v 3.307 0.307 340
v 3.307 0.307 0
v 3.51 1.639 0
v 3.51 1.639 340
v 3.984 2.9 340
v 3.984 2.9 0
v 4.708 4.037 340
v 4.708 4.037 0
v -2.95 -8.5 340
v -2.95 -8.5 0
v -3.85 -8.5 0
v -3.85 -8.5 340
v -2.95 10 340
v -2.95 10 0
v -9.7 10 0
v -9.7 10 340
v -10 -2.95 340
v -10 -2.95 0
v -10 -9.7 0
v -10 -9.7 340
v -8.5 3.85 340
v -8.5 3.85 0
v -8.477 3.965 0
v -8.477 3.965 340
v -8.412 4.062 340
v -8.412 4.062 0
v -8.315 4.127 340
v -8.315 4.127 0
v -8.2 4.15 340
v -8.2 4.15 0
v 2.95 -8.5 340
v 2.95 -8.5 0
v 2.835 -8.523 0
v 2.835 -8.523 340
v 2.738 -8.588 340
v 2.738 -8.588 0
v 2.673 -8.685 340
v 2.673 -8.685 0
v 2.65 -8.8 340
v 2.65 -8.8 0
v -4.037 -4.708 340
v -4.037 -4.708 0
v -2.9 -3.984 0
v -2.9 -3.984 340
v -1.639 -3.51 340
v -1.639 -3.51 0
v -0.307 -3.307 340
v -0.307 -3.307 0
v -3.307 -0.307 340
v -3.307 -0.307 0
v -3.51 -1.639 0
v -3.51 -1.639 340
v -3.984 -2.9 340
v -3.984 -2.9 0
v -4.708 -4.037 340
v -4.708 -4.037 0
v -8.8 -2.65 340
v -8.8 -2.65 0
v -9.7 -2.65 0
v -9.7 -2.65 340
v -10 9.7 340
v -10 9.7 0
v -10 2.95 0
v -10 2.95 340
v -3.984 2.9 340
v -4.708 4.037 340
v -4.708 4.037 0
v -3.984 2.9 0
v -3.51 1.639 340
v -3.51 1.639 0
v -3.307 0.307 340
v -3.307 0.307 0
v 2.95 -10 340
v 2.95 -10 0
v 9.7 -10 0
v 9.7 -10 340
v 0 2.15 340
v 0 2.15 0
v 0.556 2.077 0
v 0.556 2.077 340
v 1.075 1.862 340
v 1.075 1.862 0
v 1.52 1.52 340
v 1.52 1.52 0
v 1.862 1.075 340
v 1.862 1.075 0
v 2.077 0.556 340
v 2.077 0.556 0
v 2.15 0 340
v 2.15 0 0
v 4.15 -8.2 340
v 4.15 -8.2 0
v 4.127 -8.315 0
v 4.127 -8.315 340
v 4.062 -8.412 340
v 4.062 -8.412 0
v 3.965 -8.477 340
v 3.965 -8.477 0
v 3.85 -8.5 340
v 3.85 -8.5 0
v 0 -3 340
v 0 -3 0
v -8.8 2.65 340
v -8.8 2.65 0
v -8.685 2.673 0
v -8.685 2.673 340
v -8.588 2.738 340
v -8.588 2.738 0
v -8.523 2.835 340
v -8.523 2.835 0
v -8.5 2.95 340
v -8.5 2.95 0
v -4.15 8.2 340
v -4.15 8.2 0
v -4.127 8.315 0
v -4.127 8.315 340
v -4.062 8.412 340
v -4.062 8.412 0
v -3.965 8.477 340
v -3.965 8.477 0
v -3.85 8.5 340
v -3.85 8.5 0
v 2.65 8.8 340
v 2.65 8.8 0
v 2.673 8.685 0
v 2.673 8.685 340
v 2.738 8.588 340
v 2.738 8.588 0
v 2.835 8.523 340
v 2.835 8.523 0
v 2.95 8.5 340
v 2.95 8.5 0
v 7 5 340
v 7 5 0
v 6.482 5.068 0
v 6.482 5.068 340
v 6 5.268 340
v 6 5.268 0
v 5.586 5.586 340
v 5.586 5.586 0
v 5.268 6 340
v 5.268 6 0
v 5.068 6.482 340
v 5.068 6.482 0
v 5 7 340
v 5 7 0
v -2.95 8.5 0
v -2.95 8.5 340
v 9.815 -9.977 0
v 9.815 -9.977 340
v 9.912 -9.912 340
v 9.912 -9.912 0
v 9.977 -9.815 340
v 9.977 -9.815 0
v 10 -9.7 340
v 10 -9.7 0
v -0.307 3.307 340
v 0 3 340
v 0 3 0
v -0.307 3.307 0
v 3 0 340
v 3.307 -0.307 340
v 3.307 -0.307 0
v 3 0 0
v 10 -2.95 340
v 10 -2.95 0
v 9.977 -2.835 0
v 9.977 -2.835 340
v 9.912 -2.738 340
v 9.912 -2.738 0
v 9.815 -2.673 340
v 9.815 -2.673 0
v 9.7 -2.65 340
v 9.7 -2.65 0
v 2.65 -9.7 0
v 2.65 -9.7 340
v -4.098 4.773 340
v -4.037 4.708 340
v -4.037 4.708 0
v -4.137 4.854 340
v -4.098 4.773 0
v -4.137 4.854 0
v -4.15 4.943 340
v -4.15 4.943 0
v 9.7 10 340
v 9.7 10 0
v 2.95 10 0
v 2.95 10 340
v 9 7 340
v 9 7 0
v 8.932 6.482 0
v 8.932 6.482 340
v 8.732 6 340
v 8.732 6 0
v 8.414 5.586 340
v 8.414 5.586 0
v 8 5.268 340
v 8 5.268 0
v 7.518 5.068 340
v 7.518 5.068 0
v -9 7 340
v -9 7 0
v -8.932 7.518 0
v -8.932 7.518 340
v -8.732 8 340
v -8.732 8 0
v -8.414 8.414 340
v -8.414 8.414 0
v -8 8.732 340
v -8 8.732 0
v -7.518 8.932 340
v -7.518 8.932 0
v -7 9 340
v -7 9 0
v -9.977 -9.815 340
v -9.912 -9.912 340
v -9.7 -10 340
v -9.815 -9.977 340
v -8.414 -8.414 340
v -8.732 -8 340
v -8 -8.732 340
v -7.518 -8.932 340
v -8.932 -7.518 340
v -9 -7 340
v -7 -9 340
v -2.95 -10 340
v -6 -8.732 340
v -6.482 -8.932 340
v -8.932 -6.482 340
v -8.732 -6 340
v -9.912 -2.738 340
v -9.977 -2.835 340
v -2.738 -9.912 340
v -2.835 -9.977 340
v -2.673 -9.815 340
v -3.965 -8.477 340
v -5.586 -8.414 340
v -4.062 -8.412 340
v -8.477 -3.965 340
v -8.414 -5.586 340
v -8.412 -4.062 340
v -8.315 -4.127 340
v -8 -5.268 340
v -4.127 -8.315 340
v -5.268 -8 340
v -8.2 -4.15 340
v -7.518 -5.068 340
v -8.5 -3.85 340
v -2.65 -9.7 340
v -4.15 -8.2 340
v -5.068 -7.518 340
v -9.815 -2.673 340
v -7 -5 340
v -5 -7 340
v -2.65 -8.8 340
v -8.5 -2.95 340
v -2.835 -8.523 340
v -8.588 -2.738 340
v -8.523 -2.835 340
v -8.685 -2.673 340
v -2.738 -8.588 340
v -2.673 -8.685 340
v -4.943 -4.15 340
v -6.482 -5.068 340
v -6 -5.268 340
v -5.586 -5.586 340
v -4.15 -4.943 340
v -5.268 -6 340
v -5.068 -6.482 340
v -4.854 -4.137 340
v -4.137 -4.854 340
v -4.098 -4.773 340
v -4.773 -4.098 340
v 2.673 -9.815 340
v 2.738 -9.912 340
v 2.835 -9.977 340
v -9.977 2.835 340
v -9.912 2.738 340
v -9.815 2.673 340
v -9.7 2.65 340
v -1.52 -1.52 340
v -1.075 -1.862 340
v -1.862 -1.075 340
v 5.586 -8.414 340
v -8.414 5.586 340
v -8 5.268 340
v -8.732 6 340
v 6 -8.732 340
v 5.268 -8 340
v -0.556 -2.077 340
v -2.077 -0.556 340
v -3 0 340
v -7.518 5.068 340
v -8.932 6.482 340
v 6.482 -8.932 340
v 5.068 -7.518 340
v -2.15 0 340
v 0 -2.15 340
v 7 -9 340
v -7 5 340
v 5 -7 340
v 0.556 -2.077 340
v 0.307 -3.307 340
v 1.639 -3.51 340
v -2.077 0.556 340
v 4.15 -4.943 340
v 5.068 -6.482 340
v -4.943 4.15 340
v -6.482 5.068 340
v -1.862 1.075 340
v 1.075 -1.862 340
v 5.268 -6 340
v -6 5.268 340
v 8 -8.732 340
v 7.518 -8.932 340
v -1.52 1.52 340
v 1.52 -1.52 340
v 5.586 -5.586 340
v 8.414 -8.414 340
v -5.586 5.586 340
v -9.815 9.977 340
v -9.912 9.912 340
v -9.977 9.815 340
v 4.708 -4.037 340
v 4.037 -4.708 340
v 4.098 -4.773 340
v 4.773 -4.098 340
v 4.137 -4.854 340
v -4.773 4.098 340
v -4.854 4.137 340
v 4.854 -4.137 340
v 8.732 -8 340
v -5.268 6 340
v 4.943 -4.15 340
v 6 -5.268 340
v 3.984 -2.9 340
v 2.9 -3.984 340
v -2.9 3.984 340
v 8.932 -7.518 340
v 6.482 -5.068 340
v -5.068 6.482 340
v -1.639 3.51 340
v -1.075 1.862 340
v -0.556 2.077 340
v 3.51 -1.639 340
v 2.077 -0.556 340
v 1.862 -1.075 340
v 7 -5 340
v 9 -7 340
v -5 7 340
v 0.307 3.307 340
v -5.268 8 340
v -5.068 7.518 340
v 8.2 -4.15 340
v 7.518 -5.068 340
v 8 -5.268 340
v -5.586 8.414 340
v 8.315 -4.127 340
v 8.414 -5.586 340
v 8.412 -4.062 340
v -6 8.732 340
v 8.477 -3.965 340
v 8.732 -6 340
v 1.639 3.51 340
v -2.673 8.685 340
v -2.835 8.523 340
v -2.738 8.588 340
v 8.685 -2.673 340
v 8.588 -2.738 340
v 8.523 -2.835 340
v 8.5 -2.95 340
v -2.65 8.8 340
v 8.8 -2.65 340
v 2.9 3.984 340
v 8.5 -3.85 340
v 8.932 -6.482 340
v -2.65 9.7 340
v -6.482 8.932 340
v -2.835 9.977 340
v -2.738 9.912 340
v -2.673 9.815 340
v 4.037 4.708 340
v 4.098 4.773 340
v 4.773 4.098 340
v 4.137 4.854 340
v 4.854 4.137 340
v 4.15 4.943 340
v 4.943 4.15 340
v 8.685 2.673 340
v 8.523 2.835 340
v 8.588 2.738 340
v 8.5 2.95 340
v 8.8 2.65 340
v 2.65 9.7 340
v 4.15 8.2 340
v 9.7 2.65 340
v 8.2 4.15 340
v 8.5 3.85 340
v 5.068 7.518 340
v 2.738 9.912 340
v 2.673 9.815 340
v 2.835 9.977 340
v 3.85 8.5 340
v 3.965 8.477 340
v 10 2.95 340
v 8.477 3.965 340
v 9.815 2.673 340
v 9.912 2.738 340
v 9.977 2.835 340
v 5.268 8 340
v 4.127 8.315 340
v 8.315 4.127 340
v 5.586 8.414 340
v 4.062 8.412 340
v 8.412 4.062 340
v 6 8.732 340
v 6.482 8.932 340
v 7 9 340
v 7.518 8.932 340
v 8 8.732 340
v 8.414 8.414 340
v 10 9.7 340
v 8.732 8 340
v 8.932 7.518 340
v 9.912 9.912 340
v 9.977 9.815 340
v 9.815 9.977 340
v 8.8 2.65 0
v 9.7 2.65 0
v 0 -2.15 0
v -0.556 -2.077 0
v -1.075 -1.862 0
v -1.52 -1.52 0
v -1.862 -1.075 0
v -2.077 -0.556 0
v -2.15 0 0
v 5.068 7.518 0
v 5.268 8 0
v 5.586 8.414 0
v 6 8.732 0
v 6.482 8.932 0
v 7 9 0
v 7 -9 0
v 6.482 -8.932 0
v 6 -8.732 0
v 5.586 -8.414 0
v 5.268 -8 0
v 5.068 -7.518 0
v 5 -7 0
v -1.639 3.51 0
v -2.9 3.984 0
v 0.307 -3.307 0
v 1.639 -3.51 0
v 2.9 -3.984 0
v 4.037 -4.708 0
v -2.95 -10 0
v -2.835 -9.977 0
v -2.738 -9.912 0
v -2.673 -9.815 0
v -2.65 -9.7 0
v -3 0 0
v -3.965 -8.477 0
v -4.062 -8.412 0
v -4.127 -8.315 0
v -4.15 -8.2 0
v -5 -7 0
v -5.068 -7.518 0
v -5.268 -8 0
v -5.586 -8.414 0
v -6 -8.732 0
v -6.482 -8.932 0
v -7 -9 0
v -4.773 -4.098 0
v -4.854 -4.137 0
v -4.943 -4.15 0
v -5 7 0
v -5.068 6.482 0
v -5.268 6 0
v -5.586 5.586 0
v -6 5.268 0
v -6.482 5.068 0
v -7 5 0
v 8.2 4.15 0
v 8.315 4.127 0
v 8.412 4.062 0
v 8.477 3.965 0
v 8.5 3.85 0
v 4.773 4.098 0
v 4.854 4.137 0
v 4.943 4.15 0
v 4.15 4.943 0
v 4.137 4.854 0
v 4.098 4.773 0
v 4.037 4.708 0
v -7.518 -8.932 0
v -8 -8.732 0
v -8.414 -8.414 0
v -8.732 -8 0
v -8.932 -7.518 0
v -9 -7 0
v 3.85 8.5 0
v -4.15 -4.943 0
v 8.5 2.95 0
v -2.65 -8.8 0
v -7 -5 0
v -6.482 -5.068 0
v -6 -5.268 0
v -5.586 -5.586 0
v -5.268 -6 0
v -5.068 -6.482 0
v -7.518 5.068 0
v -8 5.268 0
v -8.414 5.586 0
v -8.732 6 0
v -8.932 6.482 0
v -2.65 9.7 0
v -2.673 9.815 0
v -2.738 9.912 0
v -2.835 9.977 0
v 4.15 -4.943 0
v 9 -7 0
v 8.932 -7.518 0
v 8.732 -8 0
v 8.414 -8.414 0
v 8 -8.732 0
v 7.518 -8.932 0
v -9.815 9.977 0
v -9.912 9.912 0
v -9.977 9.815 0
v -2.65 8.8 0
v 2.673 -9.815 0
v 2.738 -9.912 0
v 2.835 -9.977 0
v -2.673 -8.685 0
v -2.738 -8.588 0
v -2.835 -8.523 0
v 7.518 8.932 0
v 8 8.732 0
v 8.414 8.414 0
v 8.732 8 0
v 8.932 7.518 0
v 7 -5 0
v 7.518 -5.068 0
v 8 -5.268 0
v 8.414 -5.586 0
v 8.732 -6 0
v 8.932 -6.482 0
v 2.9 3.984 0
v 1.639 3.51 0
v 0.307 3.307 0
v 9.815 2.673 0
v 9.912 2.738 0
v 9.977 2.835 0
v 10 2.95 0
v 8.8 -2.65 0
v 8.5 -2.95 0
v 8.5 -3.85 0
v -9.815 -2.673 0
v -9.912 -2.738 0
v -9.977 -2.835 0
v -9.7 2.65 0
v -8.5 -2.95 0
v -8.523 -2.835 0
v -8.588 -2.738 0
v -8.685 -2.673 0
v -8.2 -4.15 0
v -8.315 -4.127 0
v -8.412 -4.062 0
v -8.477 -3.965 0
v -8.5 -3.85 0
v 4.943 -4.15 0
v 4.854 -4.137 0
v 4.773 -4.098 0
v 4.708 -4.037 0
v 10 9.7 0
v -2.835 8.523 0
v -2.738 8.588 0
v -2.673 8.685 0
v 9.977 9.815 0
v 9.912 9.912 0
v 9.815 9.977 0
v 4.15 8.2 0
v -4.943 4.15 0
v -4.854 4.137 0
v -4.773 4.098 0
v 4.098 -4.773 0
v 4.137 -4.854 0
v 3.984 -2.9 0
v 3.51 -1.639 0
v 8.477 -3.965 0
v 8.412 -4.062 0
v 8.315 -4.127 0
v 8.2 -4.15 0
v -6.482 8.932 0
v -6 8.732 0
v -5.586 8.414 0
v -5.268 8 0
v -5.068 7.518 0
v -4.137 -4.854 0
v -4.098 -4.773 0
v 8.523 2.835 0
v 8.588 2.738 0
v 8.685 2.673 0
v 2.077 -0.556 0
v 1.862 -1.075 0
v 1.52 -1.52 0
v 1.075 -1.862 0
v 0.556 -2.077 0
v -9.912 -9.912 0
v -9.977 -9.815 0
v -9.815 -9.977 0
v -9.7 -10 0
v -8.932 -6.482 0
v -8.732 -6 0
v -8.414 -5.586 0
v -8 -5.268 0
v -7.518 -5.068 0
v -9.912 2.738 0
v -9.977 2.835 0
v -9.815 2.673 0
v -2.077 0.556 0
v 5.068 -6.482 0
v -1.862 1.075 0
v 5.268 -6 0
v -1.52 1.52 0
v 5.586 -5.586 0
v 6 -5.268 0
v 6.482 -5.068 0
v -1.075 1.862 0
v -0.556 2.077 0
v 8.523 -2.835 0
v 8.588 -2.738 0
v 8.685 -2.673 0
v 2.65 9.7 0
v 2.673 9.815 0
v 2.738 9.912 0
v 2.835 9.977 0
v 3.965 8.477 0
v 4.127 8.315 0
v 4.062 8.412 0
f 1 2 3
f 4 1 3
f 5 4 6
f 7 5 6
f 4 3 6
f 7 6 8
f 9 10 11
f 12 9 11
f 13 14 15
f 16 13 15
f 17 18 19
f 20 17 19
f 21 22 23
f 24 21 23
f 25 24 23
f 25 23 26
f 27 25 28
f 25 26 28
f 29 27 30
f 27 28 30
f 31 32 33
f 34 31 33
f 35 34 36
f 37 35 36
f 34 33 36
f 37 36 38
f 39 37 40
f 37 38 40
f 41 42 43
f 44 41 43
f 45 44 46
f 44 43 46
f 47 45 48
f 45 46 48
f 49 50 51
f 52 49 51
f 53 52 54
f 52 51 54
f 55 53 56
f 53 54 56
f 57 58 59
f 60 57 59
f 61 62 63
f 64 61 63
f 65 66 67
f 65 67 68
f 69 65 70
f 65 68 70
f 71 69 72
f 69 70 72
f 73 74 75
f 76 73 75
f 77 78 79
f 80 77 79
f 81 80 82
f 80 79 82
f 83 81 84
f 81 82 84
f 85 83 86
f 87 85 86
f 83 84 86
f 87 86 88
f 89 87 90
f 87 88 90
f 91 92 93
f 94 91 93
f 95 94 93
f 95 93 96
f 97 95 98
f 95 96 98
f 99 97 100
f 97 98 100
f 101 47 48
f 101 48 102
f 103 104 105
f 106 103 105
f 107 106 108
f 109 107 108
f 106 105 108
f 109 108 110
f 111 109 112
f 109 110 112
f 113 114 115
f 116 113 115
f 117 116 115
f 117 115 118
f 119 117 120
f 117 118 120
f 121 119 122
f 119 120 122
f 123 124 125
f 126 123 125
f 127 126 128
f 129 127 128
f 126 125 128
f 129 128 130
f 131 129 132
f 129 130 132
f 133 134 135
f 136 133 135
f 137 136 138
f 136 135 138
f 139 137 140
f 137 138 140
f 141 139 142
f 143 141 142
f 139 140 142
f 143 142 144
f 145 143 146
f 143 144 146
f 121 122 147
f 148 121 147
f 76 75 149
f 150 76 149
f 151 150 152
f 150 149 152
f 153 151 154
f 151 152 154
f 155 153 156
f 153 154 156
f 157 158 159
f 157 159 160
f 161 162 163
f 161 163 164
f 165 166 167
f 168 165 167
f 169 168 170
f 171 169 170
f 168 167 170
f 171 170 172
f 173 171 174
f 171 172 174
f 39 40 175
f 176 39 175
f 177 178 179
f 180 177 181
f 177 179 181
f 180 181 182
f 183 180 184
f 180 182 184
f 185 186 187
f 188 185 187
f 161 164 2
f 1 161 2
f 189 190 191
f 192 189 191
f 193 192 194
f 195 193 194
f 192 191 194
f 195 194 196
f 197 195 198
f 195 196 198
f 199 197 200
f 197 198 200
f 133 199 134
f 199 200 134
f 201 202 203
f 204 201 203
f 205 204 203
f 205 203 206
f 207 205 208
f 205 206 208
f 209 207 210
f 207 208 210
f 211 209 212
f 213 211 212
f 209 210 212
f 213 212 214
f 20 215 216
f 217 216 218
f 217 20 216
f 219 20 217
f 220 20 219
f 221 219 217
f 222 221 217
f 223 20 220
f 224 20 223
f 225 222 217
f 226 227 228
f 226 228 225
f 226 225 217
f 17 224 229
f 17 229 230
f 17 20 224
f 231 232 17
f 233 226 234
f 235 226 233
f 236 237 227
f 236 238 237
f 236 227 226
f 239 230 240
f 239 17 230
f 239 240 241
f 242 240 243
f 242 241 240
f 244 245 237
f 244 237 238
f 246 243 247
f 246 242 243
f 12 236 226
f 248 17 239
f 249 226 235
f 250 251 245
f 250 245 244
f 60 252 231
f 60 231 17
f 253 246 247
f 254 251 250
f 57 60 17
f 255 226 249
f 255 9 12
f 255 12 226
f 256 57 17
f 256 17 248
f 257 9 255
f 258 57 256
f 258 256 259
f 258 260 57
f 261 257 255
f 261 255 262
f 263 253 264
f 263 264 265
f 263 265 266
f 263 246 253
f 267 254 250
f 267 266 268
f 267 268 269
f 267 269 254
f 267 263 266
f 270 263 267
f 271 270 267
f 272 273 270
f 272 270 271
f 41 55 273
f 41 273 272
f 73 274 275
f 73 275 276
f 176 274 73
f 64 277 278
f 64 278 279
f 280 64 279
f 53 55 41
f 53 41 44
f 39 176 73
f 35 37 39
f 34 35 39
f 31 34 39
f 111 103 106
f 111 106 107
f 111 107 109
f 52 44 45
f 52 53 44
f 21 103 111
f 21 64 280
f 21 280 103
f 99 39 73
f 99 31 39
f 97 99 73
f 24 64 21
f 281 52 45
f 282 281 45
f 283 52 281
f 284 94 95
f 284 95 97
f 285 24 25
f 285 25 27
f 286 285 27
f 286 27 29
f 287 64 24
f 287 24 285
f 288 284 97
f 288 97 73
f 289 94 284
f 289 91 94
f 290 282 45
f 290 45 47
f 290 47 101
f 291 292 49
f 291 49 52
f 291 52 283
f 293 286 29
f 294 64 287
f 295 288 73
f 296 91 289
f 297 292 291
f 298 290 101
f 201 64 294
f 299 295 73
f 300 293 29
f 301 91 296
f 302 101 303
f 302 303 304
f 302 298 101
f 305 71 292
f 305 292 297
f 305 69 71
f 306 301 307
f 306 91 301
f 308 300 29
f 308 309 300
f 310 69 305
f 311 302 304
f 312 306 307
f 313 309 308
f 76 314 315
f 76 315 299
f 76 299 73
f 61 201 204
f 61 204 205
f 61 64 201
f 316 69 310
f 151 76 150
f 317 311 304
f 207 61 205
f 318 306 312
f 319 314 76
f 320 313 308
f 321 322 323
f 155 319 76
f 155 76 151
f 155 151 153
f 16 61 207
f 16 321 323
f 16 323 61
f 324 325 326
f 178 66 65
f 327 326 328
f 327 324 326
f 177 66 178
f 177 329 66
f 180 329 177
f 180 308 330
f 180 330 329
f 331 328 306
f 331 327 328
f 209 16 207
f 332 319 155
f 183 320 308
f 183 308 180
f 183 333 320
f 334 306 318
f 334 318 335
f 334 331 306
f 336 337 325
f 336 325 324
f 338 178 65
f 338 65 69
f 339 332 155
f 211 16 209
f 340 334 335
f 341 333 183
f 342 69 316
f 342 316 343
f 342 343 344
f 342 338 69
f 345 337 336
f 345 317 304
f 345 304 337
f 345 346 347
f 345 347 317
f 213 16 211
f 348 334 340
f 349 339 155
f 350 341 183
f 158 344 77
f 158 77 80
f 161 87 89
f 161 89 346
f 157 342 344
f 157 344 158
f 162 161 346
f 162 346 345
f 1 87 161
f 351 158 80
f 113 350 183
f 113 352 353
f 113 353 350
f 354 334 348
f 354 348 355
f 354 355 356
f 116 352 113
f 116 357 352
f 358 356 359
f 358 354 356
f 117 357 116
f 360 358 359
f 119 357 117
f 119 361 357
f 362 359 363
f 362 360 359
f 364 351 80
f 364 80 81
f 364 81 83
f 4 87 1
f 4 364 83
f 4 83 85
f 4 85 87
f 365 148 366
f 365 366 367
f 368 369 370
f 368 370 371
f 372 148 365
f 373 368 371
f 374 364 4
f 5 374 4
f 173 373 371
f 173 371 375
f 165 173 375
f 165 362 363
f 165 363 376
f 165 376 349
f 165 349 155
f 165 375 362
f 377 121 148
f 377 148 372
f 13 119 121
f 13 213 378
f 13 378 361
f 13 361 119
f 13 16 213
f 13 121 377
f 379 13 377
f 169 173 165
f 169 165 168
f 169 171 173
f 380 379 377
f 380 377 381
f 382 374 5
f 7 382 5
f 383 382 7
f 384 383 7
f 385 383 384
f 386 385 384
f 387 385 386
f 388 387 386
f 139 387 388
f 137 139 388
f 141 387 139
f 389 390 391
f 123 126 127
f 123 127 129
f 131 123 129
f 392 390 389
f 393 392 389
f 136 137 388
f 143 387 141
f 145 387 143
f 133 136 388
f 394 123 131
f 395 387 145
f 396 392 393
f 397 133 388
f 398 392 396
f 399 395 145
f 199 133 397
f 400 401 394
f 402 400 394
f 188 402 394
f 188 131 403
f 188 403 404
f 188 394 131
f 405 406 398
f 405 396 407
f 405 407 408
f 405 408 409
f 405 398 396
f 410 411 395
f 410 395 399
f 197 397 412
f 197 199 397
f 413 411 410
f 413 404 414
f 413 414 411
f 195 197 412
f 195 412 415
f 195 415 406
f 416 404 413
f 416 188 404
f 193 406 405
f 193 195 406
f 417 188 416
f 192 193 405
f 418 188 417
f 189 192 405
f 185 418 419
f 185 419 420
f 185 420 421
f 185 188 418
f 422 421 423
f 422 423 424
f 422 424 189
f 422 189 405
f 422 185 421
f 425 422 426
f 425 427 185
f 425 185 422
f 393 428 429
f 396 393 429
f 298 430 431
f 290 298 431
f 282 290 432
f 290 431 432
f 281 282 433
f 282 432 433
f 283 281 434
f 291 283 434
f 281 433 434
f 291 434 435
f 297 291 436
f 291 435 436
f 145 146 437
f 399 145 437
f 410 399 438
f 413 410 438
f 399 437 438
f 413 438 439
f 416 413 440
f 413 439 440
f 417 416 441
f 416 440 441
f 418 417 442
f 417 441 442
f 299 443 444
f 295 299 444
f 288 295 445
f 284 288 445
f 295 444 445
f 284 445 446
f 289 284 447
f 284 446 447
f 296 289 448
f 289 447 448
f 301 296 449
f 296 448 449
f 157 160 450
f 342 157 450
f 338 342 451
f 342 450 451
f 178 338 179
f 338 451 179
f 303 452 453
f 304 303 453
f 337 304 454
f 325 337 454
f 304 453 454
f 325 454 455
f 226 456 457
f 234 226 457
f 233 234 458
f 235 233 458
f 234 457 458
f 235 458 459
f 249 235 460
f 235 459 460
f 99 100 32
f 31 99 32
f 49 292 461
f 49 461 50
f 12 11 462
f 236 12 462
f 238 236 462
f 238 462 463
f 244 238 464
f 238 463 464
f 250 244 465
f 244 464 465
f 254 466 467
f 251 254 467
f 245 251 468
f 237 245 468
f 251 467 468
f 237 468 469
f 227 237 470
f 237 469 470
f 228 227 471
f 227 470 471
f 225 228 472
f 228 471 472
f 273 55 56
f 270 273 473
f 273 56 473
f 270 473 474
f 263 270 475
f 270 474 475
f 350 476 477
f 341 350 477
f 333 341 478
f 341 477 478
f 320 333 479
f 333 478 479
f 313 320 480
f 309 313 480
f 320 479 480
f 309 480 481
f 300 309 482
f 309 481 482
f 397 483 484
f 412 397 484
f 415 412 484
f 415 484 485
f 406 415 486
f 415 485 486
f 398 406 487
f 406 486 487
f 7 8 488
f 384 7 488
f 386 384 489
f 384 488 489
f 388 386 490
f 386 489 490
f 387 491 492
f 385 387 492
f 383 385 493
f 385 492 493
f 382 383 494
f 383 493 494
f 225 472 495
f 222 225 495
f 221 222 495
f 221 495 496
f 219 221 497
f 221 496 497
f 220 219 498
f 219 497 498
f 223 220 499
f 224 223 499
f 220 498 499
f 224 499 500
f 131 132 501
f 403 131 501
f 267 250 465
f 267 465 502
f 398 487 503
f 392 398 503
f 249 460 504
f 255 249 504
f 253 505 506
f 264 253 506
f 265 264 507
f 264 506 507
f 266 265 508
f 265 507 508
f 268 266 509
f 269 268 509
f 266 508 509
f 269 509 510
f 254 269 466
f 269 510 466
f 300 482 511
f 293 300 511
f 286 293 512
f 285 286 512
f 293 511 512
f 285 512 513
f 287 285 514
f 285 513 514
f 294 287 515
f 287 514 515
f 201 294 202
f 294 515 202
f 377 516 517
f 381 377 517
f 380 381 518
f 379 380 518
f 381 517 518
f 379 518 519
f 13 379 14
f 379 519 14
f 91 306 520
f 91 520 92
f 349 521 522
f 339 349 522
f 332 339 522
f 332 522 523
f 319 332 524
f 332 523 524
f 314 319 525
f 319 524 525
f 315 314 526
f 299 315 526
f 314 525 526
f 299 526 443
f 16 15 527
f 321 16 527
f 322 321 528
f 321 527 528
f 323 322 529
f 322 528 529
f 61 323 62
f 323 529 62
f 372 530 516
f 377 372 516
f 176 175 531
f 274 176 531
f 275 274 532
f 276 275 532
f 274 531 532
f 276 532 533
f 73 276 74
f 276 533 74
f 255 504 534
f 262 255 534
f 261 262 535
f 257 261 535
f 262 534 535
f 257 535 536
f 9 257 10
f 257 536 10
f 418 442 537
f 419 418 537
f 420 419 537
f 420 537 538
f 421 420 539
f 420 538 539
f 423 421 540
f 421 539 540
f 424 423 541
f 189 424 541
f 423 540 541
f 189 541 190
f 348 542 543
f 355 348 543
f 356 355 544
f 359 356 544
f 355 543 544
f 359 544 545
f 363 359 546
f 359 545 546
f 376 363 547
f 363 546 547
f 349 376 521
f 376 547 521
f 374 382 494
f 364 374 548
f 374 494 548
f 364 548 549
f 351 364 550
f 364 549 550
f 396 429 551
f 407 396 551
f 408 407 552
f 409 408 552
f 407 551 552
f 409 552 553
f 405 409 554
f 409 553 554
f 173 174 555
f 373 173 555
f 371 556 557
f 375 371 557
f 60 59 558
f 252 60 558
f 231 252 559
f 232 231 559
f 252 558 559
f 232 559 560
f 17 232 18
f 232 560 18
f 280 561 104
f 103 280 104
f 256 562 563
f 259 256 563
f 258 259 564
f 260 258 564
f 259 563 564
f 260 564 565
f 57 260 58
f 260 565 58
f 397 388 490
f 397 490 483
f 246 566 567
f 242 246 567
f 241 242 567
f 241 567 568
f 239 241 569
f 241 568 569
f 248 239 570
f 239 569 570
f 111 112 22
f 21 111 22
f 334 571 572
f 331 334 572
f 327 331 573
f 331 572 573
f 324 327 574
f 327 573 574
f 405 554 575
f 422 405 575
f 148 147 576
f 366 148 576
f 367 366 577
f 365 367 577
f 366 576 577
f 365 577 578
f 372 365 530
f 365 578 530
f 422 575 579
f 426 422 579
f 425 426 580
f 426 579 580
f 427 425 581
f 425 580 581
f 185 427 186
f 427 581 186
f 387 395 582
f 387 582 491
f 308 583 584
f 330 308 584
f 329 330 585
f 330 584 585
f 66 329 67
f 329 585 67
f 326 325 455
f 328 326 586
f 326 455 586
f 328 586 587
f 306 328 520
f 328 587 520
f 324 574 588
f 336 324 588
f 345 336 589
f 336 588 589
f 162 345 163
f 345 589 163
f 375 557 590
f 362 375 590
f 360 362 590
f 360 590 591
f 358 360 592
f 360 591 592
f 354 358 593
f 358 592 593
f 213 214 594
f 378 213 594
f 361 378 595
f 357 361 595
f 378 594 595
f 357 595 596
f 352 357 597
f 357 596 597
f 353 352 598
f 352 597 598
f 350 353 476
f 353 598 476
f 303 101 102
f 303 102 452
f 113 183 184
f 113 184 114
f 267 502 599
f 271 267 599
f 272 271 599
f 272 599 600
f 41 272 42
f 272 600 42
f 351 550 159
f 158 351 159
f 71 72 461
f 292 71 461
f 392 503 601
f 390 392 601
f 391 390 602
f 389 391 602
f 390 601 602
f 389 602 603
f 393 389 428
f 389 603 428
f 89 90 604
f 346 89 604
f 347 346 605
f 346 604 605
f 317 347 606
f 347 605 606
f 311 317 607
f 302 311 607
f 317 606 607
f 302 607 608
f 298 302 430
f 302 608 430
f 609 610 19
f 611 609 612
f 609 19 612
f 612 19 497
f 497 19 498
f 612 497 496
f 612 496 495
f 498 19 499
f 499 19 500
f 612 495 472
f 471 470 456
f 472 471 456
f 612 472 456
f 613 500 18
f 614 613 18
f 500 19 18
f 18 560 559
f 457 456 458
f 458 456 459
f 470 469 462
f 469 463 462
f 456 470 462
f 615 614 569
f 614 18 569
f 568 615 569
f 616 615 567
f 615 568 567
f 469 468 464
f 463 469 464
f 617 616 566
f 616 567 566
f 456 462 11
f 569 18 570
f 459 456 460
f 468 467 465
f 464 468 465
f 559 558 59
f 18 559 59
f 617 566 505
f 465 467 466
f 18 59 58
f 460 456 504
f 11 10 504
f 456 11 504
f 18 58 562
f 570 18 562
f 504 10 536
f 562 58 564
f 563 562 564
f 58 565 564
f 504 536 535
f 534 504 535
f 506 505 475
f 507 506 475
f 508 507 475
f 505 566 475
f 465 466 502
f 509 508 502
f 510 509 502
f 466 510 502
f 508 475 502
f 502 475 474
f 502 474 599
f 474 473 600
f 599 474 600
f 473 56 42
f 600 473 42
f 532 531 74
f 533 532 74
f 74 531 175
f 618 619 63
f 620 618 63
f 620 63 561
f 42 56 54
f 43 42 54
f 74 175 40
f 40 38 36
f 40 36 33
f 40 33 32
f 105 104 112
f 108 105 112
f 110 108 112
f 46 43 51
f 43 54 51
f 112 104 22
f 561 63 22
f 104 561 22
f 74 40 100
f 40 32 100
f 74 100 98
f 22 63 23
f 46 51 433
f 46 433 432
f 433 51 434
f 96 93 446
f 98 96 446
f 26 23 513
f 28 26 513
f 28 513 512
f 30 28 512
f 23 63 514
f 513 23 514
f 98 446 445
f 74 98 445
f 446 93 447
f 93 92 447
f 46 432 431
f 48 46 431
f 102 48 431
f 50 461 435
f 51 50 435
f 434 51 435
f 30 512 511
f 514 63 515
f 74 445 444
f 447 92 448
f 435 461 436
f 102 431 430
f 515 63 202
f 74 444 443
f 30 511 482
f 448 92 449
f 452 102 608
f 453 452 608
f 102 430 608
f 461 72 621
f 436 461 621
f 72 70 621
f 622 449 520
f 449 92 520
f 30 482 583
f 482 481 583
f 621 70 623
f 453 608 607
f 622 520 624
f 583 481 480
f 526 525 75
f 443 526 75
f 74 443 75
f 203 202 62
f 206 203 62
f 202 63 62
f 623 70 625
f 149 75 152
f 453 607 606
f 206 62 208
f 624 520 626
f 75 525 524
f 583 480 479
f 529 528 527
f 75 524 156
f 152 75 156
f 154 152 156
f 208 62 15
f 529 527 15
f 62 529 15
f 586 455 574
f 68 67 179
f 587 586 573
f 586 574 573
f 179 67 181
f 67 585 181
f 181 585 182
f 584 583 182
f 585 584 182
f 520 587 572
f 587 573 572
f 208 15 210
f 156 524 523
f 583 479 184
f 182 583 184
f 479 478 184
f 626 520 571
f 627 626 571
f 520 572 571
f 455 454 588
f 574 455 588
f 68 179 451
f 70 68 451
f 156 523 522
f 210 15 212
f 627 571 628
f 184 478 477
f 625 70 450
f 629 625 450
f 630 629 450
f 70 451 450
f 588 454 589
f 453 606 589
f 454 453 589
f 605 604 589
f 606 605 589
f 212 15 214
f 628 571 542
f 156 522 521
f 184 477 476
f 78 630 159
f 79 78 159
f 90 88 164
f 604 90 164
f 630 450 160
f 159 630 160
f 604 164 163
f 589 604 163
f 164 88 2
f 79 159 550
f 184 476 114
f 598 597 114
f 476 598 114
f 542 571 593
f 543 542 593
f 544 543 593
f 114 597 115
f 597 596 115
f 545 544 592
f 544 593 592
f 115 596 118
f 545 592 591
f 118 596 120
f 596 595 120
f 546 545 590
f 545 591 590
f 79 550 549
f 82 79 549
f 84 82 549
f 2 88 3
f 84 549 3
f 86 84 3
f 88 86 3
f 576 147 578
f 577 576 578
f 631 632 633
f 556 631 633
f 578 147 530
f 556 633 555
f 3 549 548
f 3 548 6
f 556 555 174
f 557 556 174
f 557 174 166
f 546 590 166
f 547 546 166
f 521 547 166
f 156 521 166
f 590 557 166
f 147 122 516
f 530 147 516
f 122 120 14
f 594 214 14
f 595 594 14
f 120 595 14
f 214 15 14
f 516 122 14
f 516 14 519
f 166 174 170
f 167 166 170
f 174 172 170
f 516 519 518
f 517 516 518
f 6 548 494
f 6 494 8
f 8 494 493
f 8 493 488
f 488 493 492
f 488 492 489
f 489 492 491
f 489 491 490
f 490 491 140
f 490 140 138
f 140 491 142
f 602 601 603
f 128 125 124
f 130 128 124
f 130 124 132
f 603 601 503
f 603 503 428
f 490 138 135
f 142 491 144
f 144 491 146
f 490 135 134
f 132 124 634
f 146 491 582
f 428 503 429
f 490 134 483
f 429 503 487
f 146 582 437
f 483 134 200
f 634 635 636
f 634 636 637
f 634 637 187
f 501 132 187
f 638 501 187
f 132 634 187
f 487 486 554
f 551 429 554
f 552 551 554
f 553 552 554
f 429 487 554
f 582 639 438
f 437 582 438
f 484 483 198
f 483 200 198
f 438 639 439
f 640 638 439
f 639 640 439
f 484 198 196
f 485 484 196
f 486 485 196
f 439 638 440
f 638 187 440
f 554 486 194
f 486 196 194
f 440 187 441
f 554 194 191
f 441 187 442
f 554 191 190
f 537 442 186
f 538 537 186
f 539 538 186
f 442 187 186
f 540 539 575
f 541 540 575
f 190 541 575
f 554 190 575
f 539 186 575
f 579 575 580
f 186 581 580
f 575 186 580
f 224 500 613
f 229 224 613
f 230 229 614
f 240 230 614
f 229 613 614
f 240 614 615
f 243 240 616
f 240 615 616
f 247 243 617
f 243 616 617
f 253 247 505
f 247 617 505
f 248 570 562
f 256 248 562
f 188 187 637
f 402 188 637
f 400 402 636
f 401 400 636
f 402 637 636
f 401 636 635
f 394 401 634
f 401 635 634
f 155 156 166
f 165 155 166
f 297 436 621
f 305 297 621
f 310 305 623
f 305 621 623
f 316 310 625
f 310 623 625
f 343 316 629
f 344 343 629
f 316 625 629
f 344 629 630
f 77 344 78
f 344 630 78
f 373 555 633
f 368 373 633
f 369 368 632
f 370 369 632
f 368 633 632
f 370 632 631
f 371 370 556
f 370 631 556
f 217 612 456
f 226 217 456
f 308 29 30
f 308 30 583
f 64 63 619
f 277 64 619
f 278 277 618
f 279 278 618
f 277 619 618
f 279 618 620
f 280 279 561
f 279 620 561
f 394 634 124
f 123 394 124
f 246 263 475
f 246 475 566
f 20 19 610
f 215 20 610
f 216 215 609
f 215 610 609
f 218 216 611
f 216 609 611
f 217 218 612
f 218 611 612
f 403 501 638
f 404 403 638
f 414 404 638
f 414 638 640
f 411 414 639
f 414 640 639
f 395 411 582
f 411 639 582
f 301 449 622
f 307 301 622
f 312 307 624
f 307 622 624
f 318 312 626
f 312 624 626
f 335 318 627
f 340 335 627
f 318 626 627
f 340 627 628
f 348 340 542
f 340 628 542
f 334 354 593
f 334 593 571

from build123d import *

# Parameters (mm, degrees)
F1_DEPTH = 340


# Not quite as in the source:
# - ends of sketch curves that miss each other by under 0.0002 mm in the source are joined


with BuildPart() as f1:
    # F0 (on Top) → F1 (new body)
    with BuildSketch(Plane.XY):
        with BuildLine():
            ThreePointArc((-2.15, 0), (-1.5202795796, 1.5202795796), (0, 2.15))
            Line((0, 2.15), (0, 3))
            Line((0, 3), (-0.307277, 3.307278))
            ThreePointArc((-0.307277, 3.307278), (-2.2820211583, 3.7143800615), (-4.036565823, 4.7078182229))
            ThreePointArc((-4.036565823, 4.7078182229), (-4.1201572004, 4.8123081084), (-4.15, 4.94275))
            Line((-4.15, 4.94275), (-4.15, 8.2))
            ThreePointArc((-4.15, 8.2), (-4.0621320344, 8.4121320344), (-3.85, 8.5))
            Line((-3.85, 8.5), (-2.95, 8.5))
            ThreePointArc((-2.95, 8.5), (-2.7378679656, 8.5878679656), (-2.65, 8.8))
            Line((-2.65, 8.8), (-2.65, 9.7))
            ThreePointArc((-2.65, 9.7), (-2.7378679656, 9.9121320344), (-2.95, 10))
            Line((-2.95, 10), (-9.7, 10))
            ThreePointArc((-9.7, 10), (-9.9121320344, 9.9121320344), (-10, 9.7))
            Line((-10, 9.7), (-10, 2.95))
            ThreePointArc((-10, 2.95), (-9.9121320344, 2.7378679656), (-9.7, 2.65))
            Line((-9.7, 2.65), (-8.8, 2.65))
            ThreePointArc((-8.8, 2.65), (-8.5878679656, 2.7378679656), (-8.5, 2.95))
            Line((-8.5, 2.95), (-8.5, 3.85))
            ThreePointArc((-8.5, 3.85), (-8.4121320344, 4.0621320344), (-8.2, 4.15))
            Line((-8.2, 4.15), (-4.942749, 4.15))
            ThreePointArc((-4.942749, 4.15), (-4.812307461, 4.1201573706), (-4.7078173786, 4.0365666993))
            ThreePointArc((-4.7078173786, 4.0365666993), (-3.7143793747, 2.2820219924), (-3.3072773955, 0.3072779813))
            Line((-3.3072773955, 0.3072779813), (-3, 0))
            Line((-3, 0), (-2.15, 0))
        make_face()
        with BuildLine():
            ThreePointArc((-7, 5), (-8.4142135624, 5.5857864376), (-9, 7))
            ThreePointArc((-9, 7), (-8.4142135624, 8.4142135624), (-7, 9))
            ThreePointArc((-7, 9), (-5.5857864376, 8.4142135624), (-5, 7))
            ThreePointArc((-5, 7), (-5.5857864376, 5.5857864376), (-7, 5))
        make_face(mode=Mode.SUBTRACT)
        with BuildLine():
            ThreePointArc((0, 2.15), (1.5202795796, 1.5202795796), (2.15, 0))
            Line((2.15, 0), (3, 0))
            Line((3, 0), (3.307278, 0.307278))
            ThreePointArc((3.307278, 0.307278), (3.7143803747, 2.2820219924), (4.7078187099, 4.0365664363))
            ThreePointArc((4.7078187099, 4.0365664363), (4.812308461, 4.1201573706), (4.94275, 4.15))
            Line((4.94275, 4.15), (8.2, 4.15))
            ThreePointArc((8.2, 4.15), (8.4121320344, 4.0621320344), (8.5, 3.85))
            Line((8.5, 3.85), (8.5, 2.95))
            ThreePointArc((8.5, 2.95), (8.5878679656, 2.7378679656), (8.8, 2.65))
            Line((8.8, 2.65), (9.7, 2.65))
            ThreePointArc((9.7, 2.65), (9.9121320344, 2.7378679656), (10, 2.95))
            Line((10, 2.95), (10, 9.7))
            ThreePointArc((10, 9.7), (9.9121320344, 9.9121320344), (9.7, 10))
            Line((9.7, 10), (2.95, 10))
            ThreePointArc((2.95, 10), (2.7378679656, 9.9121320344), (2.65, 9.7))
            Line((2.65, 9.7), (2.65, 8.8))
            ThreePointArc((2.65, 8.8), (2.7378679656, 8.5878679656), (2.95, 8.5))
            Line((2.95, 8.5), (3.85, 8.5))
            ThreePointArc((3.85, 8.5), (4.0621320344, 8.4121320344), (4.15, 8.2))
            Line((4.15, 8.2), (4.15, 4.94275))
            ThreePointArc((4.15, 4.94275), (4.1201572004, 4.8123081084), (4.036566086, 4.7078178916))
            ThreePointArc((4.036566086, 4.7078178916), (2.2820216259, 3.7143802371), (0.3072779813, 3.3072783955))
            Line((0.3072779813, 3.3072783955), (0, 3))
            Line((0, 3), (0, 2.15))
        make_face()
        with BuildLine():
            ThreePointArc((7, 9), (8.4142135624, 8.4142135624), (9, 7))
            ThreePointArc((9, 7), (8.4142135624, 5.5857864376), (7, 5))
            ThreePointArc((7, 5), (5.5857864376, 5.5857864376), (5, 7))
            ThreePointArc((5, 7), (5.5857864376, 8.4142135624), (7, 9))
        make_face(mode=Mode.SUBTRACT)
        with BuildLine():
            Line((3, 0), (2.15, 0))
            ThreePointArc((2.15, 0), (1.5202795796, -1.5202795796), (0, -2.15))
            Line((0, -2.15), (0, -3))
            Line((0, -3), (0.307278, -3.307277))
            ThreePointArc((0.307278, -3.307277), (2.2820216259, -3.7143792371), (4.036565823, -4.7078172229))
            ThreePointArc((4.036565823, -4.7078172229), (4.1201572004, -4.8123071084), (4.15, -4.942749))
            Line((4.15, -4.942749), (4.15, -8.2))
            ThreePointArc((4.15, -8.2), (4.0621320344, -8.4121320344), (3.85, -8.5))
            Line((3.85, -8.5), (2.95, -8.5))
            ThreePointArc((2.95, -8.5), (2.7378679656, -8.5878679656), (2.65, -8.8))
            Line((2.65, -8.8), (2.65, -9.7))
            ThreePointArc((2.65, -9.7), (2.7378679656, -9.9121320344), (2.95, -10))
            Line((2.95, -10), (9.7, -10))
            ThreePointArc((9.7, -10), (9.9121320344, -9.9121320344), (10, -9.7))
            Line((10, -9.7), (10, -2.95))
            ThreePointArc((10, -2.95), (9.9121320344, -2.7378679656), (9.7, -2.65))
            Line((9.7, -2.65), (8.8, -2.65))
            ThreePointArc((8.8, -2.65), (8.5878679656, -2.7378679656), (8.5, -2.95))
            Line((8.5, -2.95), (8.5, -3.85))
            ThreePointArc((8.5, -3.85), (8.4121320344, -4.0621320344), (8.2, -4.15))
            Line((8.2, -4.15), (4.94275, -4.15))
            ThreePointArc((4.94275, -4.15), (4.8123081084, -4.1201572004), (4.7078178916, -4.036566086))
            ThreePointArc((4.7078178916, -4.036566086), (3.7143800615, -2.2820211583), (3.3072783483, -0.3072769835))
            Line((3.3072783483, -0.3072769835), (3, 0))
        make_face()
        with BuildLine():
            ThreePointArc((7, -5), (8.4142135624, -5.5857864376), (9, -7))
            ThreePointArc((9, -7), (8.4142135624, -8.4142135624), (7, -9))
            ThreePointArc((7, -9), (5.5857864376, -8.4142135624), (5, -7))
            ThreePointArc((5, -7), (5.5857864376, -5.5857864376), (7, -5))
        make_face(mode=Mode.SUBTRACT)
        with BuildLine():
            Line((0, -3), (0, -2.15))
            ThreePointArc((0, -2.15), (-1.5202795796, -1.5202795796), (-2.15, 0))
            Line((-2.15, 0), (-3, 0))
            Line((-3, 0), (-3.307277, -0.307277))
            ThreePointArc((-3.307277, -0.307277), (-3.7143790615, -2.2820211583), (-4.7078172229, -4.036565823))
            ThreePointArc((-4.7078172229, -4.036565823), (-4.8123071084, -4.1201572004), (-4.942749, -4.15))
            Line((-4.942749, -4.15), (-8.2, -4.15))
            ThreePointArc((-8.2, -4.15), (-8.4121320344, -4.0621320344), (-8.5, -3.85))
            Line((-8.5, -3.85), (-8.5, -2.95))
            ThreePointArc((-8.5, -2.95), (-8.5878679656, -2.7378679656), (-8.8, -2.65))
            Line((-8.8, -2.65), (-9.7, -2.65))
            ThreePointArc((-9.7, -2.65), (-9.9121320344, -2.7378679656), (-10, -2.95))
            Line((-10, -2.95), (-10, -9.7))
            ThreePointArc((-10, -9.7), (-9.9121320344, -9.9121320344), (-9.7, -10))
            Line((-9.7, -10), (-2.95, -10))
            ThreePointArc((-2.95, -10), (-2.7378679656, -9.9121320344), (-2.65, -9.7))
            Line((-2.65, -9.7), (-2.65, -8.8))
            ThreePointArc((-2.65, -8.8), (-2.7378679656, -8.5878679656), (-2.95, -8.5))
            Line((-2.95, -8.5), (-3.85, -8.5))
            ThreePointArc((-3.85, -8.5), (-4.0621320344, -8.4121320344), (-4.15, -8.2))
            Line((-4.15, -8.2), (-4.15, -4.942749))
            ThreePointArc((-4.15, -4.942749), (-4.1201572004, -4.8123071084), (-4.036566086, -4.7078168916))
            ThreePointArc((-4.036566086, -4.7078168916), (-2.2820211583, -3.7143790615), (-0.3072769835, -3.3072773483))
            Line((-0.3072769835, -3.3072773483), (0, -3))
        make_face()
        with BuildLine():
            ThreePointArc((-7, -9), (-8.4142135624, -8.4142135624), (-9, -7))
            ThreePointArc((-9, -7), (-8.4142135624, -5.5857864376), (-7, -5))
            ThreePointArc((-7, -5), (-5.5857864376, -5.5857864376), (-5, -7))
            ThreePointArc((-5, -7), (-5.5857864376, -8.4142135624), (-7, -9))
        make_face(mode=Mode.SUBTRACT)
    extrude(amount=F1_DEPTH)


solid = f1.part
